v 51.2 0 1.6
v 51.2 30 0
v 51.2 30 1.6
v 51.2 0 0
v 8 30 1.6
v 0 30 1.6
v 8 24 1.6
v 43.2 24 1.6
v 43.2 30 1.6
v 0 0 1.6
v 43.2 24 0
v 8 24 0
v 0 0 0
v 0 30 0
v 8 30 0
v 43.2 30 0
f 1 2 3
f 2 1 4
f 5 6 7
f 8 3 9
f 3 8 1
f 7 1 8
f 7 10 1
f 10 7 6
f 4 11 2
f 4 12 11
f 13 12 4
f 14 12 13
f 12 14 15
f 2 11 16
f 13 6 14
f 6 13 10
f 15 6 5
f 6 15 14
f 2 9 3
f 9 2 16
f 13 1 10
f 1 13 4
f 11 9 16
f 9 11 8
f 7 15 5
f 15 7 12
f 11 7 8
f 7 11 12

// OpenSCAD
$fn = 40;

wallT = 2;
clearance = 0.2;

boardW = 49;
boardD = 26;
boardH = 1.6;

switchW = 6.1;
switchD = switchW;
switchBodyH = 3.1;
switchOD = 3.4;
switchHeadH = 6;
switchZ = wallT+boardH+10;
switchNumber = 5; // Play/Pause  Mute  Next  Vol+  Vol-  WindowsLock

boxD = boardD+2*(wallT+clearance)+2*wallT;
boxH = switchZ+boardH+switchHeadH+switchBodyH+1;


capW = 10;
echo("capW: ", capW);
capD = boardD+2*wallT-clearance;
capH = switchHeadH;


boxW = 2*(wallT+clearance)+(capW+clearance)*switchNumber+clearance;

usbD = 11+1;
usbH = 8+1;

buttonSize = 6;
buttonH = 1;

echo("boxW: ", boxW);
echo("boxH: ", boxH);

module cap() {
  difference() {
    // Add - Cap
    cube([capW, capD, capH]);
    // Remove - Switch
    translate([capW/2-clearance, capD/2-clearance, -1])
      cylinder(r=switchOD/2+clearance, h=capH);
  }
}

module strut() {
  difference() {
    cube([boxW-(wallT+clearance)*2, boxD-(wallT+clearance)*2, boardH]);
    translate([wallT*4, boxD-(wallT+clearance)*2-wallT*3, -1])
    cube([boxW-(wallT+clearance)*2-wallT*8, wallT*3+1, boardH+2]);
  }
}


module board() {
  color("Purple")
    cube([boardW, boardD, boardH]);
}
module switch() {
  union() {
    color("lightgrey")
      cube([switchW, switchD, switchBodyH]);
    color("darkgrey") translate([switchW/2, switchD/2, switchBodyH])
      cylinder(r=switchOD/2, h=switchHeadH);
  }
}


module mediaKeyboardBox() {
  difference() {
    // ADD - Box
    cube([boxW, boxD, boxH]);
    // Remove - Switch part
    translate([wallT, wallT, wallT+switchZ-boardH])
      cube([boxW-wallT*2, boxD-wallT*2, boxH]);
    // Remove - board part
    translate([wallT, wallT*2, wallT])
      cube([boardW+2*clearance, boxD-wallT*4, boxH]);
    // Remove USB
    translate([-1, wallT*2+0.01, wallT])
      cube([wallT+2, usbD, usbH]);
  }
}

module capPlayPause() {
  union() {
    cap();
    translate([(capW-buttonSize)/2, capD/2-buttonSize/2, capH])
      color("white") linear_extrude(buttonH, center=false)
        resize([buttonSize, buttonSize, 0])
          import("PlayPause.dxf", center=false, convexity=5);
  }
}
module capNext() {
  union() {
    cap();
    translate([(capW-buttonSize)/2, capD/2-buttonSize/2, capH])
      color("white") linear_extrude(buttonH, center=false)
        resize([buttonSize, buttonSize, 0])
          import("Next.dxf", center=false, convexity=5);
  }
}
module capVolumeDown() {
  union() {
    cap();
    translate([(capW-buttonSize)/2, capD/2-buttonSize/2, capH])
      color("white") linear_extrude(buttonH, center=false)
        resize([buttonSize, buttonSize, 0])
          import("VolumeDown.dxf", center=false, convexity=5);
  }
}
module capMute() {
  union() {
    cap();
    translate([(capW-buttonSize)/2, capD/2-buttonSize/2, capH])
      color("white") linear_extrude(buttonH, center=false)
        resize([buttonSize, buttonSize, 0])
          import("Mute.dxf", center=false, convexity=5);
  }
}
module capVolumeUp() {
  union() {
    cap();
    translate([(capW-buttonSize)/2, capD/2-buttonSize/2, capH])
      color("white") linear_extrude(buttonH, center=false)
        resize([buttonSize, buttonSize, 0])
          import("VolumeUp.dxf", center=false, convexity=5);
  }
}


mediaKeyboardBox();
translate([wallT+clearance, wallT*2+clearance, wallT+clearance])
  board();
%translate([wallT+clearance, wallT+clearance, switchZ])
  !strut();
for ( i = [1 : 1 : switchNumber] ) {
  translate([wallT+clearance+(capW-switchW)/2+(i-1)*(capW+clearance),
              (boxD-switchD)/2,
              switchZ
            ])
    switch();
  %translate([wallT+clearance+(i-1)*(capW+clearance),
                (boxD-capD)/2,
                 switchZ+switchHeadH+switchBodyH+boardH-capH+1])
    if (i == 1)      { capPlayPause(); }
    else if (i == 2) { capNext(); }
    else if (i == 3) { capVolumeDown(); }
    else if (i == 4) { capMute(); }
    else if (i == 5) { capVolumeUp(); }
}
